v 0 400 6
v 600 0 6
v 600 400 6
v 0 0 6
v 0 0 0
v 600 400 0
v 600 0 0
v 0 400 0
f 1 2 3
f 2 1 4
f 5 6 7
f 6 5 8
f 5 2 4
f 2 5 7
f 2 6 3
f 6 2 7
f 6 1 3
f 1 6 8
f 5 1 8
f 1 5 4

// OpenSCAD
$fn = 64;

length = 600;
width  = 400;
thickness = 6;

color([0.78, 0.67, 0.50])
cube([length, width, thickness], center=false);
